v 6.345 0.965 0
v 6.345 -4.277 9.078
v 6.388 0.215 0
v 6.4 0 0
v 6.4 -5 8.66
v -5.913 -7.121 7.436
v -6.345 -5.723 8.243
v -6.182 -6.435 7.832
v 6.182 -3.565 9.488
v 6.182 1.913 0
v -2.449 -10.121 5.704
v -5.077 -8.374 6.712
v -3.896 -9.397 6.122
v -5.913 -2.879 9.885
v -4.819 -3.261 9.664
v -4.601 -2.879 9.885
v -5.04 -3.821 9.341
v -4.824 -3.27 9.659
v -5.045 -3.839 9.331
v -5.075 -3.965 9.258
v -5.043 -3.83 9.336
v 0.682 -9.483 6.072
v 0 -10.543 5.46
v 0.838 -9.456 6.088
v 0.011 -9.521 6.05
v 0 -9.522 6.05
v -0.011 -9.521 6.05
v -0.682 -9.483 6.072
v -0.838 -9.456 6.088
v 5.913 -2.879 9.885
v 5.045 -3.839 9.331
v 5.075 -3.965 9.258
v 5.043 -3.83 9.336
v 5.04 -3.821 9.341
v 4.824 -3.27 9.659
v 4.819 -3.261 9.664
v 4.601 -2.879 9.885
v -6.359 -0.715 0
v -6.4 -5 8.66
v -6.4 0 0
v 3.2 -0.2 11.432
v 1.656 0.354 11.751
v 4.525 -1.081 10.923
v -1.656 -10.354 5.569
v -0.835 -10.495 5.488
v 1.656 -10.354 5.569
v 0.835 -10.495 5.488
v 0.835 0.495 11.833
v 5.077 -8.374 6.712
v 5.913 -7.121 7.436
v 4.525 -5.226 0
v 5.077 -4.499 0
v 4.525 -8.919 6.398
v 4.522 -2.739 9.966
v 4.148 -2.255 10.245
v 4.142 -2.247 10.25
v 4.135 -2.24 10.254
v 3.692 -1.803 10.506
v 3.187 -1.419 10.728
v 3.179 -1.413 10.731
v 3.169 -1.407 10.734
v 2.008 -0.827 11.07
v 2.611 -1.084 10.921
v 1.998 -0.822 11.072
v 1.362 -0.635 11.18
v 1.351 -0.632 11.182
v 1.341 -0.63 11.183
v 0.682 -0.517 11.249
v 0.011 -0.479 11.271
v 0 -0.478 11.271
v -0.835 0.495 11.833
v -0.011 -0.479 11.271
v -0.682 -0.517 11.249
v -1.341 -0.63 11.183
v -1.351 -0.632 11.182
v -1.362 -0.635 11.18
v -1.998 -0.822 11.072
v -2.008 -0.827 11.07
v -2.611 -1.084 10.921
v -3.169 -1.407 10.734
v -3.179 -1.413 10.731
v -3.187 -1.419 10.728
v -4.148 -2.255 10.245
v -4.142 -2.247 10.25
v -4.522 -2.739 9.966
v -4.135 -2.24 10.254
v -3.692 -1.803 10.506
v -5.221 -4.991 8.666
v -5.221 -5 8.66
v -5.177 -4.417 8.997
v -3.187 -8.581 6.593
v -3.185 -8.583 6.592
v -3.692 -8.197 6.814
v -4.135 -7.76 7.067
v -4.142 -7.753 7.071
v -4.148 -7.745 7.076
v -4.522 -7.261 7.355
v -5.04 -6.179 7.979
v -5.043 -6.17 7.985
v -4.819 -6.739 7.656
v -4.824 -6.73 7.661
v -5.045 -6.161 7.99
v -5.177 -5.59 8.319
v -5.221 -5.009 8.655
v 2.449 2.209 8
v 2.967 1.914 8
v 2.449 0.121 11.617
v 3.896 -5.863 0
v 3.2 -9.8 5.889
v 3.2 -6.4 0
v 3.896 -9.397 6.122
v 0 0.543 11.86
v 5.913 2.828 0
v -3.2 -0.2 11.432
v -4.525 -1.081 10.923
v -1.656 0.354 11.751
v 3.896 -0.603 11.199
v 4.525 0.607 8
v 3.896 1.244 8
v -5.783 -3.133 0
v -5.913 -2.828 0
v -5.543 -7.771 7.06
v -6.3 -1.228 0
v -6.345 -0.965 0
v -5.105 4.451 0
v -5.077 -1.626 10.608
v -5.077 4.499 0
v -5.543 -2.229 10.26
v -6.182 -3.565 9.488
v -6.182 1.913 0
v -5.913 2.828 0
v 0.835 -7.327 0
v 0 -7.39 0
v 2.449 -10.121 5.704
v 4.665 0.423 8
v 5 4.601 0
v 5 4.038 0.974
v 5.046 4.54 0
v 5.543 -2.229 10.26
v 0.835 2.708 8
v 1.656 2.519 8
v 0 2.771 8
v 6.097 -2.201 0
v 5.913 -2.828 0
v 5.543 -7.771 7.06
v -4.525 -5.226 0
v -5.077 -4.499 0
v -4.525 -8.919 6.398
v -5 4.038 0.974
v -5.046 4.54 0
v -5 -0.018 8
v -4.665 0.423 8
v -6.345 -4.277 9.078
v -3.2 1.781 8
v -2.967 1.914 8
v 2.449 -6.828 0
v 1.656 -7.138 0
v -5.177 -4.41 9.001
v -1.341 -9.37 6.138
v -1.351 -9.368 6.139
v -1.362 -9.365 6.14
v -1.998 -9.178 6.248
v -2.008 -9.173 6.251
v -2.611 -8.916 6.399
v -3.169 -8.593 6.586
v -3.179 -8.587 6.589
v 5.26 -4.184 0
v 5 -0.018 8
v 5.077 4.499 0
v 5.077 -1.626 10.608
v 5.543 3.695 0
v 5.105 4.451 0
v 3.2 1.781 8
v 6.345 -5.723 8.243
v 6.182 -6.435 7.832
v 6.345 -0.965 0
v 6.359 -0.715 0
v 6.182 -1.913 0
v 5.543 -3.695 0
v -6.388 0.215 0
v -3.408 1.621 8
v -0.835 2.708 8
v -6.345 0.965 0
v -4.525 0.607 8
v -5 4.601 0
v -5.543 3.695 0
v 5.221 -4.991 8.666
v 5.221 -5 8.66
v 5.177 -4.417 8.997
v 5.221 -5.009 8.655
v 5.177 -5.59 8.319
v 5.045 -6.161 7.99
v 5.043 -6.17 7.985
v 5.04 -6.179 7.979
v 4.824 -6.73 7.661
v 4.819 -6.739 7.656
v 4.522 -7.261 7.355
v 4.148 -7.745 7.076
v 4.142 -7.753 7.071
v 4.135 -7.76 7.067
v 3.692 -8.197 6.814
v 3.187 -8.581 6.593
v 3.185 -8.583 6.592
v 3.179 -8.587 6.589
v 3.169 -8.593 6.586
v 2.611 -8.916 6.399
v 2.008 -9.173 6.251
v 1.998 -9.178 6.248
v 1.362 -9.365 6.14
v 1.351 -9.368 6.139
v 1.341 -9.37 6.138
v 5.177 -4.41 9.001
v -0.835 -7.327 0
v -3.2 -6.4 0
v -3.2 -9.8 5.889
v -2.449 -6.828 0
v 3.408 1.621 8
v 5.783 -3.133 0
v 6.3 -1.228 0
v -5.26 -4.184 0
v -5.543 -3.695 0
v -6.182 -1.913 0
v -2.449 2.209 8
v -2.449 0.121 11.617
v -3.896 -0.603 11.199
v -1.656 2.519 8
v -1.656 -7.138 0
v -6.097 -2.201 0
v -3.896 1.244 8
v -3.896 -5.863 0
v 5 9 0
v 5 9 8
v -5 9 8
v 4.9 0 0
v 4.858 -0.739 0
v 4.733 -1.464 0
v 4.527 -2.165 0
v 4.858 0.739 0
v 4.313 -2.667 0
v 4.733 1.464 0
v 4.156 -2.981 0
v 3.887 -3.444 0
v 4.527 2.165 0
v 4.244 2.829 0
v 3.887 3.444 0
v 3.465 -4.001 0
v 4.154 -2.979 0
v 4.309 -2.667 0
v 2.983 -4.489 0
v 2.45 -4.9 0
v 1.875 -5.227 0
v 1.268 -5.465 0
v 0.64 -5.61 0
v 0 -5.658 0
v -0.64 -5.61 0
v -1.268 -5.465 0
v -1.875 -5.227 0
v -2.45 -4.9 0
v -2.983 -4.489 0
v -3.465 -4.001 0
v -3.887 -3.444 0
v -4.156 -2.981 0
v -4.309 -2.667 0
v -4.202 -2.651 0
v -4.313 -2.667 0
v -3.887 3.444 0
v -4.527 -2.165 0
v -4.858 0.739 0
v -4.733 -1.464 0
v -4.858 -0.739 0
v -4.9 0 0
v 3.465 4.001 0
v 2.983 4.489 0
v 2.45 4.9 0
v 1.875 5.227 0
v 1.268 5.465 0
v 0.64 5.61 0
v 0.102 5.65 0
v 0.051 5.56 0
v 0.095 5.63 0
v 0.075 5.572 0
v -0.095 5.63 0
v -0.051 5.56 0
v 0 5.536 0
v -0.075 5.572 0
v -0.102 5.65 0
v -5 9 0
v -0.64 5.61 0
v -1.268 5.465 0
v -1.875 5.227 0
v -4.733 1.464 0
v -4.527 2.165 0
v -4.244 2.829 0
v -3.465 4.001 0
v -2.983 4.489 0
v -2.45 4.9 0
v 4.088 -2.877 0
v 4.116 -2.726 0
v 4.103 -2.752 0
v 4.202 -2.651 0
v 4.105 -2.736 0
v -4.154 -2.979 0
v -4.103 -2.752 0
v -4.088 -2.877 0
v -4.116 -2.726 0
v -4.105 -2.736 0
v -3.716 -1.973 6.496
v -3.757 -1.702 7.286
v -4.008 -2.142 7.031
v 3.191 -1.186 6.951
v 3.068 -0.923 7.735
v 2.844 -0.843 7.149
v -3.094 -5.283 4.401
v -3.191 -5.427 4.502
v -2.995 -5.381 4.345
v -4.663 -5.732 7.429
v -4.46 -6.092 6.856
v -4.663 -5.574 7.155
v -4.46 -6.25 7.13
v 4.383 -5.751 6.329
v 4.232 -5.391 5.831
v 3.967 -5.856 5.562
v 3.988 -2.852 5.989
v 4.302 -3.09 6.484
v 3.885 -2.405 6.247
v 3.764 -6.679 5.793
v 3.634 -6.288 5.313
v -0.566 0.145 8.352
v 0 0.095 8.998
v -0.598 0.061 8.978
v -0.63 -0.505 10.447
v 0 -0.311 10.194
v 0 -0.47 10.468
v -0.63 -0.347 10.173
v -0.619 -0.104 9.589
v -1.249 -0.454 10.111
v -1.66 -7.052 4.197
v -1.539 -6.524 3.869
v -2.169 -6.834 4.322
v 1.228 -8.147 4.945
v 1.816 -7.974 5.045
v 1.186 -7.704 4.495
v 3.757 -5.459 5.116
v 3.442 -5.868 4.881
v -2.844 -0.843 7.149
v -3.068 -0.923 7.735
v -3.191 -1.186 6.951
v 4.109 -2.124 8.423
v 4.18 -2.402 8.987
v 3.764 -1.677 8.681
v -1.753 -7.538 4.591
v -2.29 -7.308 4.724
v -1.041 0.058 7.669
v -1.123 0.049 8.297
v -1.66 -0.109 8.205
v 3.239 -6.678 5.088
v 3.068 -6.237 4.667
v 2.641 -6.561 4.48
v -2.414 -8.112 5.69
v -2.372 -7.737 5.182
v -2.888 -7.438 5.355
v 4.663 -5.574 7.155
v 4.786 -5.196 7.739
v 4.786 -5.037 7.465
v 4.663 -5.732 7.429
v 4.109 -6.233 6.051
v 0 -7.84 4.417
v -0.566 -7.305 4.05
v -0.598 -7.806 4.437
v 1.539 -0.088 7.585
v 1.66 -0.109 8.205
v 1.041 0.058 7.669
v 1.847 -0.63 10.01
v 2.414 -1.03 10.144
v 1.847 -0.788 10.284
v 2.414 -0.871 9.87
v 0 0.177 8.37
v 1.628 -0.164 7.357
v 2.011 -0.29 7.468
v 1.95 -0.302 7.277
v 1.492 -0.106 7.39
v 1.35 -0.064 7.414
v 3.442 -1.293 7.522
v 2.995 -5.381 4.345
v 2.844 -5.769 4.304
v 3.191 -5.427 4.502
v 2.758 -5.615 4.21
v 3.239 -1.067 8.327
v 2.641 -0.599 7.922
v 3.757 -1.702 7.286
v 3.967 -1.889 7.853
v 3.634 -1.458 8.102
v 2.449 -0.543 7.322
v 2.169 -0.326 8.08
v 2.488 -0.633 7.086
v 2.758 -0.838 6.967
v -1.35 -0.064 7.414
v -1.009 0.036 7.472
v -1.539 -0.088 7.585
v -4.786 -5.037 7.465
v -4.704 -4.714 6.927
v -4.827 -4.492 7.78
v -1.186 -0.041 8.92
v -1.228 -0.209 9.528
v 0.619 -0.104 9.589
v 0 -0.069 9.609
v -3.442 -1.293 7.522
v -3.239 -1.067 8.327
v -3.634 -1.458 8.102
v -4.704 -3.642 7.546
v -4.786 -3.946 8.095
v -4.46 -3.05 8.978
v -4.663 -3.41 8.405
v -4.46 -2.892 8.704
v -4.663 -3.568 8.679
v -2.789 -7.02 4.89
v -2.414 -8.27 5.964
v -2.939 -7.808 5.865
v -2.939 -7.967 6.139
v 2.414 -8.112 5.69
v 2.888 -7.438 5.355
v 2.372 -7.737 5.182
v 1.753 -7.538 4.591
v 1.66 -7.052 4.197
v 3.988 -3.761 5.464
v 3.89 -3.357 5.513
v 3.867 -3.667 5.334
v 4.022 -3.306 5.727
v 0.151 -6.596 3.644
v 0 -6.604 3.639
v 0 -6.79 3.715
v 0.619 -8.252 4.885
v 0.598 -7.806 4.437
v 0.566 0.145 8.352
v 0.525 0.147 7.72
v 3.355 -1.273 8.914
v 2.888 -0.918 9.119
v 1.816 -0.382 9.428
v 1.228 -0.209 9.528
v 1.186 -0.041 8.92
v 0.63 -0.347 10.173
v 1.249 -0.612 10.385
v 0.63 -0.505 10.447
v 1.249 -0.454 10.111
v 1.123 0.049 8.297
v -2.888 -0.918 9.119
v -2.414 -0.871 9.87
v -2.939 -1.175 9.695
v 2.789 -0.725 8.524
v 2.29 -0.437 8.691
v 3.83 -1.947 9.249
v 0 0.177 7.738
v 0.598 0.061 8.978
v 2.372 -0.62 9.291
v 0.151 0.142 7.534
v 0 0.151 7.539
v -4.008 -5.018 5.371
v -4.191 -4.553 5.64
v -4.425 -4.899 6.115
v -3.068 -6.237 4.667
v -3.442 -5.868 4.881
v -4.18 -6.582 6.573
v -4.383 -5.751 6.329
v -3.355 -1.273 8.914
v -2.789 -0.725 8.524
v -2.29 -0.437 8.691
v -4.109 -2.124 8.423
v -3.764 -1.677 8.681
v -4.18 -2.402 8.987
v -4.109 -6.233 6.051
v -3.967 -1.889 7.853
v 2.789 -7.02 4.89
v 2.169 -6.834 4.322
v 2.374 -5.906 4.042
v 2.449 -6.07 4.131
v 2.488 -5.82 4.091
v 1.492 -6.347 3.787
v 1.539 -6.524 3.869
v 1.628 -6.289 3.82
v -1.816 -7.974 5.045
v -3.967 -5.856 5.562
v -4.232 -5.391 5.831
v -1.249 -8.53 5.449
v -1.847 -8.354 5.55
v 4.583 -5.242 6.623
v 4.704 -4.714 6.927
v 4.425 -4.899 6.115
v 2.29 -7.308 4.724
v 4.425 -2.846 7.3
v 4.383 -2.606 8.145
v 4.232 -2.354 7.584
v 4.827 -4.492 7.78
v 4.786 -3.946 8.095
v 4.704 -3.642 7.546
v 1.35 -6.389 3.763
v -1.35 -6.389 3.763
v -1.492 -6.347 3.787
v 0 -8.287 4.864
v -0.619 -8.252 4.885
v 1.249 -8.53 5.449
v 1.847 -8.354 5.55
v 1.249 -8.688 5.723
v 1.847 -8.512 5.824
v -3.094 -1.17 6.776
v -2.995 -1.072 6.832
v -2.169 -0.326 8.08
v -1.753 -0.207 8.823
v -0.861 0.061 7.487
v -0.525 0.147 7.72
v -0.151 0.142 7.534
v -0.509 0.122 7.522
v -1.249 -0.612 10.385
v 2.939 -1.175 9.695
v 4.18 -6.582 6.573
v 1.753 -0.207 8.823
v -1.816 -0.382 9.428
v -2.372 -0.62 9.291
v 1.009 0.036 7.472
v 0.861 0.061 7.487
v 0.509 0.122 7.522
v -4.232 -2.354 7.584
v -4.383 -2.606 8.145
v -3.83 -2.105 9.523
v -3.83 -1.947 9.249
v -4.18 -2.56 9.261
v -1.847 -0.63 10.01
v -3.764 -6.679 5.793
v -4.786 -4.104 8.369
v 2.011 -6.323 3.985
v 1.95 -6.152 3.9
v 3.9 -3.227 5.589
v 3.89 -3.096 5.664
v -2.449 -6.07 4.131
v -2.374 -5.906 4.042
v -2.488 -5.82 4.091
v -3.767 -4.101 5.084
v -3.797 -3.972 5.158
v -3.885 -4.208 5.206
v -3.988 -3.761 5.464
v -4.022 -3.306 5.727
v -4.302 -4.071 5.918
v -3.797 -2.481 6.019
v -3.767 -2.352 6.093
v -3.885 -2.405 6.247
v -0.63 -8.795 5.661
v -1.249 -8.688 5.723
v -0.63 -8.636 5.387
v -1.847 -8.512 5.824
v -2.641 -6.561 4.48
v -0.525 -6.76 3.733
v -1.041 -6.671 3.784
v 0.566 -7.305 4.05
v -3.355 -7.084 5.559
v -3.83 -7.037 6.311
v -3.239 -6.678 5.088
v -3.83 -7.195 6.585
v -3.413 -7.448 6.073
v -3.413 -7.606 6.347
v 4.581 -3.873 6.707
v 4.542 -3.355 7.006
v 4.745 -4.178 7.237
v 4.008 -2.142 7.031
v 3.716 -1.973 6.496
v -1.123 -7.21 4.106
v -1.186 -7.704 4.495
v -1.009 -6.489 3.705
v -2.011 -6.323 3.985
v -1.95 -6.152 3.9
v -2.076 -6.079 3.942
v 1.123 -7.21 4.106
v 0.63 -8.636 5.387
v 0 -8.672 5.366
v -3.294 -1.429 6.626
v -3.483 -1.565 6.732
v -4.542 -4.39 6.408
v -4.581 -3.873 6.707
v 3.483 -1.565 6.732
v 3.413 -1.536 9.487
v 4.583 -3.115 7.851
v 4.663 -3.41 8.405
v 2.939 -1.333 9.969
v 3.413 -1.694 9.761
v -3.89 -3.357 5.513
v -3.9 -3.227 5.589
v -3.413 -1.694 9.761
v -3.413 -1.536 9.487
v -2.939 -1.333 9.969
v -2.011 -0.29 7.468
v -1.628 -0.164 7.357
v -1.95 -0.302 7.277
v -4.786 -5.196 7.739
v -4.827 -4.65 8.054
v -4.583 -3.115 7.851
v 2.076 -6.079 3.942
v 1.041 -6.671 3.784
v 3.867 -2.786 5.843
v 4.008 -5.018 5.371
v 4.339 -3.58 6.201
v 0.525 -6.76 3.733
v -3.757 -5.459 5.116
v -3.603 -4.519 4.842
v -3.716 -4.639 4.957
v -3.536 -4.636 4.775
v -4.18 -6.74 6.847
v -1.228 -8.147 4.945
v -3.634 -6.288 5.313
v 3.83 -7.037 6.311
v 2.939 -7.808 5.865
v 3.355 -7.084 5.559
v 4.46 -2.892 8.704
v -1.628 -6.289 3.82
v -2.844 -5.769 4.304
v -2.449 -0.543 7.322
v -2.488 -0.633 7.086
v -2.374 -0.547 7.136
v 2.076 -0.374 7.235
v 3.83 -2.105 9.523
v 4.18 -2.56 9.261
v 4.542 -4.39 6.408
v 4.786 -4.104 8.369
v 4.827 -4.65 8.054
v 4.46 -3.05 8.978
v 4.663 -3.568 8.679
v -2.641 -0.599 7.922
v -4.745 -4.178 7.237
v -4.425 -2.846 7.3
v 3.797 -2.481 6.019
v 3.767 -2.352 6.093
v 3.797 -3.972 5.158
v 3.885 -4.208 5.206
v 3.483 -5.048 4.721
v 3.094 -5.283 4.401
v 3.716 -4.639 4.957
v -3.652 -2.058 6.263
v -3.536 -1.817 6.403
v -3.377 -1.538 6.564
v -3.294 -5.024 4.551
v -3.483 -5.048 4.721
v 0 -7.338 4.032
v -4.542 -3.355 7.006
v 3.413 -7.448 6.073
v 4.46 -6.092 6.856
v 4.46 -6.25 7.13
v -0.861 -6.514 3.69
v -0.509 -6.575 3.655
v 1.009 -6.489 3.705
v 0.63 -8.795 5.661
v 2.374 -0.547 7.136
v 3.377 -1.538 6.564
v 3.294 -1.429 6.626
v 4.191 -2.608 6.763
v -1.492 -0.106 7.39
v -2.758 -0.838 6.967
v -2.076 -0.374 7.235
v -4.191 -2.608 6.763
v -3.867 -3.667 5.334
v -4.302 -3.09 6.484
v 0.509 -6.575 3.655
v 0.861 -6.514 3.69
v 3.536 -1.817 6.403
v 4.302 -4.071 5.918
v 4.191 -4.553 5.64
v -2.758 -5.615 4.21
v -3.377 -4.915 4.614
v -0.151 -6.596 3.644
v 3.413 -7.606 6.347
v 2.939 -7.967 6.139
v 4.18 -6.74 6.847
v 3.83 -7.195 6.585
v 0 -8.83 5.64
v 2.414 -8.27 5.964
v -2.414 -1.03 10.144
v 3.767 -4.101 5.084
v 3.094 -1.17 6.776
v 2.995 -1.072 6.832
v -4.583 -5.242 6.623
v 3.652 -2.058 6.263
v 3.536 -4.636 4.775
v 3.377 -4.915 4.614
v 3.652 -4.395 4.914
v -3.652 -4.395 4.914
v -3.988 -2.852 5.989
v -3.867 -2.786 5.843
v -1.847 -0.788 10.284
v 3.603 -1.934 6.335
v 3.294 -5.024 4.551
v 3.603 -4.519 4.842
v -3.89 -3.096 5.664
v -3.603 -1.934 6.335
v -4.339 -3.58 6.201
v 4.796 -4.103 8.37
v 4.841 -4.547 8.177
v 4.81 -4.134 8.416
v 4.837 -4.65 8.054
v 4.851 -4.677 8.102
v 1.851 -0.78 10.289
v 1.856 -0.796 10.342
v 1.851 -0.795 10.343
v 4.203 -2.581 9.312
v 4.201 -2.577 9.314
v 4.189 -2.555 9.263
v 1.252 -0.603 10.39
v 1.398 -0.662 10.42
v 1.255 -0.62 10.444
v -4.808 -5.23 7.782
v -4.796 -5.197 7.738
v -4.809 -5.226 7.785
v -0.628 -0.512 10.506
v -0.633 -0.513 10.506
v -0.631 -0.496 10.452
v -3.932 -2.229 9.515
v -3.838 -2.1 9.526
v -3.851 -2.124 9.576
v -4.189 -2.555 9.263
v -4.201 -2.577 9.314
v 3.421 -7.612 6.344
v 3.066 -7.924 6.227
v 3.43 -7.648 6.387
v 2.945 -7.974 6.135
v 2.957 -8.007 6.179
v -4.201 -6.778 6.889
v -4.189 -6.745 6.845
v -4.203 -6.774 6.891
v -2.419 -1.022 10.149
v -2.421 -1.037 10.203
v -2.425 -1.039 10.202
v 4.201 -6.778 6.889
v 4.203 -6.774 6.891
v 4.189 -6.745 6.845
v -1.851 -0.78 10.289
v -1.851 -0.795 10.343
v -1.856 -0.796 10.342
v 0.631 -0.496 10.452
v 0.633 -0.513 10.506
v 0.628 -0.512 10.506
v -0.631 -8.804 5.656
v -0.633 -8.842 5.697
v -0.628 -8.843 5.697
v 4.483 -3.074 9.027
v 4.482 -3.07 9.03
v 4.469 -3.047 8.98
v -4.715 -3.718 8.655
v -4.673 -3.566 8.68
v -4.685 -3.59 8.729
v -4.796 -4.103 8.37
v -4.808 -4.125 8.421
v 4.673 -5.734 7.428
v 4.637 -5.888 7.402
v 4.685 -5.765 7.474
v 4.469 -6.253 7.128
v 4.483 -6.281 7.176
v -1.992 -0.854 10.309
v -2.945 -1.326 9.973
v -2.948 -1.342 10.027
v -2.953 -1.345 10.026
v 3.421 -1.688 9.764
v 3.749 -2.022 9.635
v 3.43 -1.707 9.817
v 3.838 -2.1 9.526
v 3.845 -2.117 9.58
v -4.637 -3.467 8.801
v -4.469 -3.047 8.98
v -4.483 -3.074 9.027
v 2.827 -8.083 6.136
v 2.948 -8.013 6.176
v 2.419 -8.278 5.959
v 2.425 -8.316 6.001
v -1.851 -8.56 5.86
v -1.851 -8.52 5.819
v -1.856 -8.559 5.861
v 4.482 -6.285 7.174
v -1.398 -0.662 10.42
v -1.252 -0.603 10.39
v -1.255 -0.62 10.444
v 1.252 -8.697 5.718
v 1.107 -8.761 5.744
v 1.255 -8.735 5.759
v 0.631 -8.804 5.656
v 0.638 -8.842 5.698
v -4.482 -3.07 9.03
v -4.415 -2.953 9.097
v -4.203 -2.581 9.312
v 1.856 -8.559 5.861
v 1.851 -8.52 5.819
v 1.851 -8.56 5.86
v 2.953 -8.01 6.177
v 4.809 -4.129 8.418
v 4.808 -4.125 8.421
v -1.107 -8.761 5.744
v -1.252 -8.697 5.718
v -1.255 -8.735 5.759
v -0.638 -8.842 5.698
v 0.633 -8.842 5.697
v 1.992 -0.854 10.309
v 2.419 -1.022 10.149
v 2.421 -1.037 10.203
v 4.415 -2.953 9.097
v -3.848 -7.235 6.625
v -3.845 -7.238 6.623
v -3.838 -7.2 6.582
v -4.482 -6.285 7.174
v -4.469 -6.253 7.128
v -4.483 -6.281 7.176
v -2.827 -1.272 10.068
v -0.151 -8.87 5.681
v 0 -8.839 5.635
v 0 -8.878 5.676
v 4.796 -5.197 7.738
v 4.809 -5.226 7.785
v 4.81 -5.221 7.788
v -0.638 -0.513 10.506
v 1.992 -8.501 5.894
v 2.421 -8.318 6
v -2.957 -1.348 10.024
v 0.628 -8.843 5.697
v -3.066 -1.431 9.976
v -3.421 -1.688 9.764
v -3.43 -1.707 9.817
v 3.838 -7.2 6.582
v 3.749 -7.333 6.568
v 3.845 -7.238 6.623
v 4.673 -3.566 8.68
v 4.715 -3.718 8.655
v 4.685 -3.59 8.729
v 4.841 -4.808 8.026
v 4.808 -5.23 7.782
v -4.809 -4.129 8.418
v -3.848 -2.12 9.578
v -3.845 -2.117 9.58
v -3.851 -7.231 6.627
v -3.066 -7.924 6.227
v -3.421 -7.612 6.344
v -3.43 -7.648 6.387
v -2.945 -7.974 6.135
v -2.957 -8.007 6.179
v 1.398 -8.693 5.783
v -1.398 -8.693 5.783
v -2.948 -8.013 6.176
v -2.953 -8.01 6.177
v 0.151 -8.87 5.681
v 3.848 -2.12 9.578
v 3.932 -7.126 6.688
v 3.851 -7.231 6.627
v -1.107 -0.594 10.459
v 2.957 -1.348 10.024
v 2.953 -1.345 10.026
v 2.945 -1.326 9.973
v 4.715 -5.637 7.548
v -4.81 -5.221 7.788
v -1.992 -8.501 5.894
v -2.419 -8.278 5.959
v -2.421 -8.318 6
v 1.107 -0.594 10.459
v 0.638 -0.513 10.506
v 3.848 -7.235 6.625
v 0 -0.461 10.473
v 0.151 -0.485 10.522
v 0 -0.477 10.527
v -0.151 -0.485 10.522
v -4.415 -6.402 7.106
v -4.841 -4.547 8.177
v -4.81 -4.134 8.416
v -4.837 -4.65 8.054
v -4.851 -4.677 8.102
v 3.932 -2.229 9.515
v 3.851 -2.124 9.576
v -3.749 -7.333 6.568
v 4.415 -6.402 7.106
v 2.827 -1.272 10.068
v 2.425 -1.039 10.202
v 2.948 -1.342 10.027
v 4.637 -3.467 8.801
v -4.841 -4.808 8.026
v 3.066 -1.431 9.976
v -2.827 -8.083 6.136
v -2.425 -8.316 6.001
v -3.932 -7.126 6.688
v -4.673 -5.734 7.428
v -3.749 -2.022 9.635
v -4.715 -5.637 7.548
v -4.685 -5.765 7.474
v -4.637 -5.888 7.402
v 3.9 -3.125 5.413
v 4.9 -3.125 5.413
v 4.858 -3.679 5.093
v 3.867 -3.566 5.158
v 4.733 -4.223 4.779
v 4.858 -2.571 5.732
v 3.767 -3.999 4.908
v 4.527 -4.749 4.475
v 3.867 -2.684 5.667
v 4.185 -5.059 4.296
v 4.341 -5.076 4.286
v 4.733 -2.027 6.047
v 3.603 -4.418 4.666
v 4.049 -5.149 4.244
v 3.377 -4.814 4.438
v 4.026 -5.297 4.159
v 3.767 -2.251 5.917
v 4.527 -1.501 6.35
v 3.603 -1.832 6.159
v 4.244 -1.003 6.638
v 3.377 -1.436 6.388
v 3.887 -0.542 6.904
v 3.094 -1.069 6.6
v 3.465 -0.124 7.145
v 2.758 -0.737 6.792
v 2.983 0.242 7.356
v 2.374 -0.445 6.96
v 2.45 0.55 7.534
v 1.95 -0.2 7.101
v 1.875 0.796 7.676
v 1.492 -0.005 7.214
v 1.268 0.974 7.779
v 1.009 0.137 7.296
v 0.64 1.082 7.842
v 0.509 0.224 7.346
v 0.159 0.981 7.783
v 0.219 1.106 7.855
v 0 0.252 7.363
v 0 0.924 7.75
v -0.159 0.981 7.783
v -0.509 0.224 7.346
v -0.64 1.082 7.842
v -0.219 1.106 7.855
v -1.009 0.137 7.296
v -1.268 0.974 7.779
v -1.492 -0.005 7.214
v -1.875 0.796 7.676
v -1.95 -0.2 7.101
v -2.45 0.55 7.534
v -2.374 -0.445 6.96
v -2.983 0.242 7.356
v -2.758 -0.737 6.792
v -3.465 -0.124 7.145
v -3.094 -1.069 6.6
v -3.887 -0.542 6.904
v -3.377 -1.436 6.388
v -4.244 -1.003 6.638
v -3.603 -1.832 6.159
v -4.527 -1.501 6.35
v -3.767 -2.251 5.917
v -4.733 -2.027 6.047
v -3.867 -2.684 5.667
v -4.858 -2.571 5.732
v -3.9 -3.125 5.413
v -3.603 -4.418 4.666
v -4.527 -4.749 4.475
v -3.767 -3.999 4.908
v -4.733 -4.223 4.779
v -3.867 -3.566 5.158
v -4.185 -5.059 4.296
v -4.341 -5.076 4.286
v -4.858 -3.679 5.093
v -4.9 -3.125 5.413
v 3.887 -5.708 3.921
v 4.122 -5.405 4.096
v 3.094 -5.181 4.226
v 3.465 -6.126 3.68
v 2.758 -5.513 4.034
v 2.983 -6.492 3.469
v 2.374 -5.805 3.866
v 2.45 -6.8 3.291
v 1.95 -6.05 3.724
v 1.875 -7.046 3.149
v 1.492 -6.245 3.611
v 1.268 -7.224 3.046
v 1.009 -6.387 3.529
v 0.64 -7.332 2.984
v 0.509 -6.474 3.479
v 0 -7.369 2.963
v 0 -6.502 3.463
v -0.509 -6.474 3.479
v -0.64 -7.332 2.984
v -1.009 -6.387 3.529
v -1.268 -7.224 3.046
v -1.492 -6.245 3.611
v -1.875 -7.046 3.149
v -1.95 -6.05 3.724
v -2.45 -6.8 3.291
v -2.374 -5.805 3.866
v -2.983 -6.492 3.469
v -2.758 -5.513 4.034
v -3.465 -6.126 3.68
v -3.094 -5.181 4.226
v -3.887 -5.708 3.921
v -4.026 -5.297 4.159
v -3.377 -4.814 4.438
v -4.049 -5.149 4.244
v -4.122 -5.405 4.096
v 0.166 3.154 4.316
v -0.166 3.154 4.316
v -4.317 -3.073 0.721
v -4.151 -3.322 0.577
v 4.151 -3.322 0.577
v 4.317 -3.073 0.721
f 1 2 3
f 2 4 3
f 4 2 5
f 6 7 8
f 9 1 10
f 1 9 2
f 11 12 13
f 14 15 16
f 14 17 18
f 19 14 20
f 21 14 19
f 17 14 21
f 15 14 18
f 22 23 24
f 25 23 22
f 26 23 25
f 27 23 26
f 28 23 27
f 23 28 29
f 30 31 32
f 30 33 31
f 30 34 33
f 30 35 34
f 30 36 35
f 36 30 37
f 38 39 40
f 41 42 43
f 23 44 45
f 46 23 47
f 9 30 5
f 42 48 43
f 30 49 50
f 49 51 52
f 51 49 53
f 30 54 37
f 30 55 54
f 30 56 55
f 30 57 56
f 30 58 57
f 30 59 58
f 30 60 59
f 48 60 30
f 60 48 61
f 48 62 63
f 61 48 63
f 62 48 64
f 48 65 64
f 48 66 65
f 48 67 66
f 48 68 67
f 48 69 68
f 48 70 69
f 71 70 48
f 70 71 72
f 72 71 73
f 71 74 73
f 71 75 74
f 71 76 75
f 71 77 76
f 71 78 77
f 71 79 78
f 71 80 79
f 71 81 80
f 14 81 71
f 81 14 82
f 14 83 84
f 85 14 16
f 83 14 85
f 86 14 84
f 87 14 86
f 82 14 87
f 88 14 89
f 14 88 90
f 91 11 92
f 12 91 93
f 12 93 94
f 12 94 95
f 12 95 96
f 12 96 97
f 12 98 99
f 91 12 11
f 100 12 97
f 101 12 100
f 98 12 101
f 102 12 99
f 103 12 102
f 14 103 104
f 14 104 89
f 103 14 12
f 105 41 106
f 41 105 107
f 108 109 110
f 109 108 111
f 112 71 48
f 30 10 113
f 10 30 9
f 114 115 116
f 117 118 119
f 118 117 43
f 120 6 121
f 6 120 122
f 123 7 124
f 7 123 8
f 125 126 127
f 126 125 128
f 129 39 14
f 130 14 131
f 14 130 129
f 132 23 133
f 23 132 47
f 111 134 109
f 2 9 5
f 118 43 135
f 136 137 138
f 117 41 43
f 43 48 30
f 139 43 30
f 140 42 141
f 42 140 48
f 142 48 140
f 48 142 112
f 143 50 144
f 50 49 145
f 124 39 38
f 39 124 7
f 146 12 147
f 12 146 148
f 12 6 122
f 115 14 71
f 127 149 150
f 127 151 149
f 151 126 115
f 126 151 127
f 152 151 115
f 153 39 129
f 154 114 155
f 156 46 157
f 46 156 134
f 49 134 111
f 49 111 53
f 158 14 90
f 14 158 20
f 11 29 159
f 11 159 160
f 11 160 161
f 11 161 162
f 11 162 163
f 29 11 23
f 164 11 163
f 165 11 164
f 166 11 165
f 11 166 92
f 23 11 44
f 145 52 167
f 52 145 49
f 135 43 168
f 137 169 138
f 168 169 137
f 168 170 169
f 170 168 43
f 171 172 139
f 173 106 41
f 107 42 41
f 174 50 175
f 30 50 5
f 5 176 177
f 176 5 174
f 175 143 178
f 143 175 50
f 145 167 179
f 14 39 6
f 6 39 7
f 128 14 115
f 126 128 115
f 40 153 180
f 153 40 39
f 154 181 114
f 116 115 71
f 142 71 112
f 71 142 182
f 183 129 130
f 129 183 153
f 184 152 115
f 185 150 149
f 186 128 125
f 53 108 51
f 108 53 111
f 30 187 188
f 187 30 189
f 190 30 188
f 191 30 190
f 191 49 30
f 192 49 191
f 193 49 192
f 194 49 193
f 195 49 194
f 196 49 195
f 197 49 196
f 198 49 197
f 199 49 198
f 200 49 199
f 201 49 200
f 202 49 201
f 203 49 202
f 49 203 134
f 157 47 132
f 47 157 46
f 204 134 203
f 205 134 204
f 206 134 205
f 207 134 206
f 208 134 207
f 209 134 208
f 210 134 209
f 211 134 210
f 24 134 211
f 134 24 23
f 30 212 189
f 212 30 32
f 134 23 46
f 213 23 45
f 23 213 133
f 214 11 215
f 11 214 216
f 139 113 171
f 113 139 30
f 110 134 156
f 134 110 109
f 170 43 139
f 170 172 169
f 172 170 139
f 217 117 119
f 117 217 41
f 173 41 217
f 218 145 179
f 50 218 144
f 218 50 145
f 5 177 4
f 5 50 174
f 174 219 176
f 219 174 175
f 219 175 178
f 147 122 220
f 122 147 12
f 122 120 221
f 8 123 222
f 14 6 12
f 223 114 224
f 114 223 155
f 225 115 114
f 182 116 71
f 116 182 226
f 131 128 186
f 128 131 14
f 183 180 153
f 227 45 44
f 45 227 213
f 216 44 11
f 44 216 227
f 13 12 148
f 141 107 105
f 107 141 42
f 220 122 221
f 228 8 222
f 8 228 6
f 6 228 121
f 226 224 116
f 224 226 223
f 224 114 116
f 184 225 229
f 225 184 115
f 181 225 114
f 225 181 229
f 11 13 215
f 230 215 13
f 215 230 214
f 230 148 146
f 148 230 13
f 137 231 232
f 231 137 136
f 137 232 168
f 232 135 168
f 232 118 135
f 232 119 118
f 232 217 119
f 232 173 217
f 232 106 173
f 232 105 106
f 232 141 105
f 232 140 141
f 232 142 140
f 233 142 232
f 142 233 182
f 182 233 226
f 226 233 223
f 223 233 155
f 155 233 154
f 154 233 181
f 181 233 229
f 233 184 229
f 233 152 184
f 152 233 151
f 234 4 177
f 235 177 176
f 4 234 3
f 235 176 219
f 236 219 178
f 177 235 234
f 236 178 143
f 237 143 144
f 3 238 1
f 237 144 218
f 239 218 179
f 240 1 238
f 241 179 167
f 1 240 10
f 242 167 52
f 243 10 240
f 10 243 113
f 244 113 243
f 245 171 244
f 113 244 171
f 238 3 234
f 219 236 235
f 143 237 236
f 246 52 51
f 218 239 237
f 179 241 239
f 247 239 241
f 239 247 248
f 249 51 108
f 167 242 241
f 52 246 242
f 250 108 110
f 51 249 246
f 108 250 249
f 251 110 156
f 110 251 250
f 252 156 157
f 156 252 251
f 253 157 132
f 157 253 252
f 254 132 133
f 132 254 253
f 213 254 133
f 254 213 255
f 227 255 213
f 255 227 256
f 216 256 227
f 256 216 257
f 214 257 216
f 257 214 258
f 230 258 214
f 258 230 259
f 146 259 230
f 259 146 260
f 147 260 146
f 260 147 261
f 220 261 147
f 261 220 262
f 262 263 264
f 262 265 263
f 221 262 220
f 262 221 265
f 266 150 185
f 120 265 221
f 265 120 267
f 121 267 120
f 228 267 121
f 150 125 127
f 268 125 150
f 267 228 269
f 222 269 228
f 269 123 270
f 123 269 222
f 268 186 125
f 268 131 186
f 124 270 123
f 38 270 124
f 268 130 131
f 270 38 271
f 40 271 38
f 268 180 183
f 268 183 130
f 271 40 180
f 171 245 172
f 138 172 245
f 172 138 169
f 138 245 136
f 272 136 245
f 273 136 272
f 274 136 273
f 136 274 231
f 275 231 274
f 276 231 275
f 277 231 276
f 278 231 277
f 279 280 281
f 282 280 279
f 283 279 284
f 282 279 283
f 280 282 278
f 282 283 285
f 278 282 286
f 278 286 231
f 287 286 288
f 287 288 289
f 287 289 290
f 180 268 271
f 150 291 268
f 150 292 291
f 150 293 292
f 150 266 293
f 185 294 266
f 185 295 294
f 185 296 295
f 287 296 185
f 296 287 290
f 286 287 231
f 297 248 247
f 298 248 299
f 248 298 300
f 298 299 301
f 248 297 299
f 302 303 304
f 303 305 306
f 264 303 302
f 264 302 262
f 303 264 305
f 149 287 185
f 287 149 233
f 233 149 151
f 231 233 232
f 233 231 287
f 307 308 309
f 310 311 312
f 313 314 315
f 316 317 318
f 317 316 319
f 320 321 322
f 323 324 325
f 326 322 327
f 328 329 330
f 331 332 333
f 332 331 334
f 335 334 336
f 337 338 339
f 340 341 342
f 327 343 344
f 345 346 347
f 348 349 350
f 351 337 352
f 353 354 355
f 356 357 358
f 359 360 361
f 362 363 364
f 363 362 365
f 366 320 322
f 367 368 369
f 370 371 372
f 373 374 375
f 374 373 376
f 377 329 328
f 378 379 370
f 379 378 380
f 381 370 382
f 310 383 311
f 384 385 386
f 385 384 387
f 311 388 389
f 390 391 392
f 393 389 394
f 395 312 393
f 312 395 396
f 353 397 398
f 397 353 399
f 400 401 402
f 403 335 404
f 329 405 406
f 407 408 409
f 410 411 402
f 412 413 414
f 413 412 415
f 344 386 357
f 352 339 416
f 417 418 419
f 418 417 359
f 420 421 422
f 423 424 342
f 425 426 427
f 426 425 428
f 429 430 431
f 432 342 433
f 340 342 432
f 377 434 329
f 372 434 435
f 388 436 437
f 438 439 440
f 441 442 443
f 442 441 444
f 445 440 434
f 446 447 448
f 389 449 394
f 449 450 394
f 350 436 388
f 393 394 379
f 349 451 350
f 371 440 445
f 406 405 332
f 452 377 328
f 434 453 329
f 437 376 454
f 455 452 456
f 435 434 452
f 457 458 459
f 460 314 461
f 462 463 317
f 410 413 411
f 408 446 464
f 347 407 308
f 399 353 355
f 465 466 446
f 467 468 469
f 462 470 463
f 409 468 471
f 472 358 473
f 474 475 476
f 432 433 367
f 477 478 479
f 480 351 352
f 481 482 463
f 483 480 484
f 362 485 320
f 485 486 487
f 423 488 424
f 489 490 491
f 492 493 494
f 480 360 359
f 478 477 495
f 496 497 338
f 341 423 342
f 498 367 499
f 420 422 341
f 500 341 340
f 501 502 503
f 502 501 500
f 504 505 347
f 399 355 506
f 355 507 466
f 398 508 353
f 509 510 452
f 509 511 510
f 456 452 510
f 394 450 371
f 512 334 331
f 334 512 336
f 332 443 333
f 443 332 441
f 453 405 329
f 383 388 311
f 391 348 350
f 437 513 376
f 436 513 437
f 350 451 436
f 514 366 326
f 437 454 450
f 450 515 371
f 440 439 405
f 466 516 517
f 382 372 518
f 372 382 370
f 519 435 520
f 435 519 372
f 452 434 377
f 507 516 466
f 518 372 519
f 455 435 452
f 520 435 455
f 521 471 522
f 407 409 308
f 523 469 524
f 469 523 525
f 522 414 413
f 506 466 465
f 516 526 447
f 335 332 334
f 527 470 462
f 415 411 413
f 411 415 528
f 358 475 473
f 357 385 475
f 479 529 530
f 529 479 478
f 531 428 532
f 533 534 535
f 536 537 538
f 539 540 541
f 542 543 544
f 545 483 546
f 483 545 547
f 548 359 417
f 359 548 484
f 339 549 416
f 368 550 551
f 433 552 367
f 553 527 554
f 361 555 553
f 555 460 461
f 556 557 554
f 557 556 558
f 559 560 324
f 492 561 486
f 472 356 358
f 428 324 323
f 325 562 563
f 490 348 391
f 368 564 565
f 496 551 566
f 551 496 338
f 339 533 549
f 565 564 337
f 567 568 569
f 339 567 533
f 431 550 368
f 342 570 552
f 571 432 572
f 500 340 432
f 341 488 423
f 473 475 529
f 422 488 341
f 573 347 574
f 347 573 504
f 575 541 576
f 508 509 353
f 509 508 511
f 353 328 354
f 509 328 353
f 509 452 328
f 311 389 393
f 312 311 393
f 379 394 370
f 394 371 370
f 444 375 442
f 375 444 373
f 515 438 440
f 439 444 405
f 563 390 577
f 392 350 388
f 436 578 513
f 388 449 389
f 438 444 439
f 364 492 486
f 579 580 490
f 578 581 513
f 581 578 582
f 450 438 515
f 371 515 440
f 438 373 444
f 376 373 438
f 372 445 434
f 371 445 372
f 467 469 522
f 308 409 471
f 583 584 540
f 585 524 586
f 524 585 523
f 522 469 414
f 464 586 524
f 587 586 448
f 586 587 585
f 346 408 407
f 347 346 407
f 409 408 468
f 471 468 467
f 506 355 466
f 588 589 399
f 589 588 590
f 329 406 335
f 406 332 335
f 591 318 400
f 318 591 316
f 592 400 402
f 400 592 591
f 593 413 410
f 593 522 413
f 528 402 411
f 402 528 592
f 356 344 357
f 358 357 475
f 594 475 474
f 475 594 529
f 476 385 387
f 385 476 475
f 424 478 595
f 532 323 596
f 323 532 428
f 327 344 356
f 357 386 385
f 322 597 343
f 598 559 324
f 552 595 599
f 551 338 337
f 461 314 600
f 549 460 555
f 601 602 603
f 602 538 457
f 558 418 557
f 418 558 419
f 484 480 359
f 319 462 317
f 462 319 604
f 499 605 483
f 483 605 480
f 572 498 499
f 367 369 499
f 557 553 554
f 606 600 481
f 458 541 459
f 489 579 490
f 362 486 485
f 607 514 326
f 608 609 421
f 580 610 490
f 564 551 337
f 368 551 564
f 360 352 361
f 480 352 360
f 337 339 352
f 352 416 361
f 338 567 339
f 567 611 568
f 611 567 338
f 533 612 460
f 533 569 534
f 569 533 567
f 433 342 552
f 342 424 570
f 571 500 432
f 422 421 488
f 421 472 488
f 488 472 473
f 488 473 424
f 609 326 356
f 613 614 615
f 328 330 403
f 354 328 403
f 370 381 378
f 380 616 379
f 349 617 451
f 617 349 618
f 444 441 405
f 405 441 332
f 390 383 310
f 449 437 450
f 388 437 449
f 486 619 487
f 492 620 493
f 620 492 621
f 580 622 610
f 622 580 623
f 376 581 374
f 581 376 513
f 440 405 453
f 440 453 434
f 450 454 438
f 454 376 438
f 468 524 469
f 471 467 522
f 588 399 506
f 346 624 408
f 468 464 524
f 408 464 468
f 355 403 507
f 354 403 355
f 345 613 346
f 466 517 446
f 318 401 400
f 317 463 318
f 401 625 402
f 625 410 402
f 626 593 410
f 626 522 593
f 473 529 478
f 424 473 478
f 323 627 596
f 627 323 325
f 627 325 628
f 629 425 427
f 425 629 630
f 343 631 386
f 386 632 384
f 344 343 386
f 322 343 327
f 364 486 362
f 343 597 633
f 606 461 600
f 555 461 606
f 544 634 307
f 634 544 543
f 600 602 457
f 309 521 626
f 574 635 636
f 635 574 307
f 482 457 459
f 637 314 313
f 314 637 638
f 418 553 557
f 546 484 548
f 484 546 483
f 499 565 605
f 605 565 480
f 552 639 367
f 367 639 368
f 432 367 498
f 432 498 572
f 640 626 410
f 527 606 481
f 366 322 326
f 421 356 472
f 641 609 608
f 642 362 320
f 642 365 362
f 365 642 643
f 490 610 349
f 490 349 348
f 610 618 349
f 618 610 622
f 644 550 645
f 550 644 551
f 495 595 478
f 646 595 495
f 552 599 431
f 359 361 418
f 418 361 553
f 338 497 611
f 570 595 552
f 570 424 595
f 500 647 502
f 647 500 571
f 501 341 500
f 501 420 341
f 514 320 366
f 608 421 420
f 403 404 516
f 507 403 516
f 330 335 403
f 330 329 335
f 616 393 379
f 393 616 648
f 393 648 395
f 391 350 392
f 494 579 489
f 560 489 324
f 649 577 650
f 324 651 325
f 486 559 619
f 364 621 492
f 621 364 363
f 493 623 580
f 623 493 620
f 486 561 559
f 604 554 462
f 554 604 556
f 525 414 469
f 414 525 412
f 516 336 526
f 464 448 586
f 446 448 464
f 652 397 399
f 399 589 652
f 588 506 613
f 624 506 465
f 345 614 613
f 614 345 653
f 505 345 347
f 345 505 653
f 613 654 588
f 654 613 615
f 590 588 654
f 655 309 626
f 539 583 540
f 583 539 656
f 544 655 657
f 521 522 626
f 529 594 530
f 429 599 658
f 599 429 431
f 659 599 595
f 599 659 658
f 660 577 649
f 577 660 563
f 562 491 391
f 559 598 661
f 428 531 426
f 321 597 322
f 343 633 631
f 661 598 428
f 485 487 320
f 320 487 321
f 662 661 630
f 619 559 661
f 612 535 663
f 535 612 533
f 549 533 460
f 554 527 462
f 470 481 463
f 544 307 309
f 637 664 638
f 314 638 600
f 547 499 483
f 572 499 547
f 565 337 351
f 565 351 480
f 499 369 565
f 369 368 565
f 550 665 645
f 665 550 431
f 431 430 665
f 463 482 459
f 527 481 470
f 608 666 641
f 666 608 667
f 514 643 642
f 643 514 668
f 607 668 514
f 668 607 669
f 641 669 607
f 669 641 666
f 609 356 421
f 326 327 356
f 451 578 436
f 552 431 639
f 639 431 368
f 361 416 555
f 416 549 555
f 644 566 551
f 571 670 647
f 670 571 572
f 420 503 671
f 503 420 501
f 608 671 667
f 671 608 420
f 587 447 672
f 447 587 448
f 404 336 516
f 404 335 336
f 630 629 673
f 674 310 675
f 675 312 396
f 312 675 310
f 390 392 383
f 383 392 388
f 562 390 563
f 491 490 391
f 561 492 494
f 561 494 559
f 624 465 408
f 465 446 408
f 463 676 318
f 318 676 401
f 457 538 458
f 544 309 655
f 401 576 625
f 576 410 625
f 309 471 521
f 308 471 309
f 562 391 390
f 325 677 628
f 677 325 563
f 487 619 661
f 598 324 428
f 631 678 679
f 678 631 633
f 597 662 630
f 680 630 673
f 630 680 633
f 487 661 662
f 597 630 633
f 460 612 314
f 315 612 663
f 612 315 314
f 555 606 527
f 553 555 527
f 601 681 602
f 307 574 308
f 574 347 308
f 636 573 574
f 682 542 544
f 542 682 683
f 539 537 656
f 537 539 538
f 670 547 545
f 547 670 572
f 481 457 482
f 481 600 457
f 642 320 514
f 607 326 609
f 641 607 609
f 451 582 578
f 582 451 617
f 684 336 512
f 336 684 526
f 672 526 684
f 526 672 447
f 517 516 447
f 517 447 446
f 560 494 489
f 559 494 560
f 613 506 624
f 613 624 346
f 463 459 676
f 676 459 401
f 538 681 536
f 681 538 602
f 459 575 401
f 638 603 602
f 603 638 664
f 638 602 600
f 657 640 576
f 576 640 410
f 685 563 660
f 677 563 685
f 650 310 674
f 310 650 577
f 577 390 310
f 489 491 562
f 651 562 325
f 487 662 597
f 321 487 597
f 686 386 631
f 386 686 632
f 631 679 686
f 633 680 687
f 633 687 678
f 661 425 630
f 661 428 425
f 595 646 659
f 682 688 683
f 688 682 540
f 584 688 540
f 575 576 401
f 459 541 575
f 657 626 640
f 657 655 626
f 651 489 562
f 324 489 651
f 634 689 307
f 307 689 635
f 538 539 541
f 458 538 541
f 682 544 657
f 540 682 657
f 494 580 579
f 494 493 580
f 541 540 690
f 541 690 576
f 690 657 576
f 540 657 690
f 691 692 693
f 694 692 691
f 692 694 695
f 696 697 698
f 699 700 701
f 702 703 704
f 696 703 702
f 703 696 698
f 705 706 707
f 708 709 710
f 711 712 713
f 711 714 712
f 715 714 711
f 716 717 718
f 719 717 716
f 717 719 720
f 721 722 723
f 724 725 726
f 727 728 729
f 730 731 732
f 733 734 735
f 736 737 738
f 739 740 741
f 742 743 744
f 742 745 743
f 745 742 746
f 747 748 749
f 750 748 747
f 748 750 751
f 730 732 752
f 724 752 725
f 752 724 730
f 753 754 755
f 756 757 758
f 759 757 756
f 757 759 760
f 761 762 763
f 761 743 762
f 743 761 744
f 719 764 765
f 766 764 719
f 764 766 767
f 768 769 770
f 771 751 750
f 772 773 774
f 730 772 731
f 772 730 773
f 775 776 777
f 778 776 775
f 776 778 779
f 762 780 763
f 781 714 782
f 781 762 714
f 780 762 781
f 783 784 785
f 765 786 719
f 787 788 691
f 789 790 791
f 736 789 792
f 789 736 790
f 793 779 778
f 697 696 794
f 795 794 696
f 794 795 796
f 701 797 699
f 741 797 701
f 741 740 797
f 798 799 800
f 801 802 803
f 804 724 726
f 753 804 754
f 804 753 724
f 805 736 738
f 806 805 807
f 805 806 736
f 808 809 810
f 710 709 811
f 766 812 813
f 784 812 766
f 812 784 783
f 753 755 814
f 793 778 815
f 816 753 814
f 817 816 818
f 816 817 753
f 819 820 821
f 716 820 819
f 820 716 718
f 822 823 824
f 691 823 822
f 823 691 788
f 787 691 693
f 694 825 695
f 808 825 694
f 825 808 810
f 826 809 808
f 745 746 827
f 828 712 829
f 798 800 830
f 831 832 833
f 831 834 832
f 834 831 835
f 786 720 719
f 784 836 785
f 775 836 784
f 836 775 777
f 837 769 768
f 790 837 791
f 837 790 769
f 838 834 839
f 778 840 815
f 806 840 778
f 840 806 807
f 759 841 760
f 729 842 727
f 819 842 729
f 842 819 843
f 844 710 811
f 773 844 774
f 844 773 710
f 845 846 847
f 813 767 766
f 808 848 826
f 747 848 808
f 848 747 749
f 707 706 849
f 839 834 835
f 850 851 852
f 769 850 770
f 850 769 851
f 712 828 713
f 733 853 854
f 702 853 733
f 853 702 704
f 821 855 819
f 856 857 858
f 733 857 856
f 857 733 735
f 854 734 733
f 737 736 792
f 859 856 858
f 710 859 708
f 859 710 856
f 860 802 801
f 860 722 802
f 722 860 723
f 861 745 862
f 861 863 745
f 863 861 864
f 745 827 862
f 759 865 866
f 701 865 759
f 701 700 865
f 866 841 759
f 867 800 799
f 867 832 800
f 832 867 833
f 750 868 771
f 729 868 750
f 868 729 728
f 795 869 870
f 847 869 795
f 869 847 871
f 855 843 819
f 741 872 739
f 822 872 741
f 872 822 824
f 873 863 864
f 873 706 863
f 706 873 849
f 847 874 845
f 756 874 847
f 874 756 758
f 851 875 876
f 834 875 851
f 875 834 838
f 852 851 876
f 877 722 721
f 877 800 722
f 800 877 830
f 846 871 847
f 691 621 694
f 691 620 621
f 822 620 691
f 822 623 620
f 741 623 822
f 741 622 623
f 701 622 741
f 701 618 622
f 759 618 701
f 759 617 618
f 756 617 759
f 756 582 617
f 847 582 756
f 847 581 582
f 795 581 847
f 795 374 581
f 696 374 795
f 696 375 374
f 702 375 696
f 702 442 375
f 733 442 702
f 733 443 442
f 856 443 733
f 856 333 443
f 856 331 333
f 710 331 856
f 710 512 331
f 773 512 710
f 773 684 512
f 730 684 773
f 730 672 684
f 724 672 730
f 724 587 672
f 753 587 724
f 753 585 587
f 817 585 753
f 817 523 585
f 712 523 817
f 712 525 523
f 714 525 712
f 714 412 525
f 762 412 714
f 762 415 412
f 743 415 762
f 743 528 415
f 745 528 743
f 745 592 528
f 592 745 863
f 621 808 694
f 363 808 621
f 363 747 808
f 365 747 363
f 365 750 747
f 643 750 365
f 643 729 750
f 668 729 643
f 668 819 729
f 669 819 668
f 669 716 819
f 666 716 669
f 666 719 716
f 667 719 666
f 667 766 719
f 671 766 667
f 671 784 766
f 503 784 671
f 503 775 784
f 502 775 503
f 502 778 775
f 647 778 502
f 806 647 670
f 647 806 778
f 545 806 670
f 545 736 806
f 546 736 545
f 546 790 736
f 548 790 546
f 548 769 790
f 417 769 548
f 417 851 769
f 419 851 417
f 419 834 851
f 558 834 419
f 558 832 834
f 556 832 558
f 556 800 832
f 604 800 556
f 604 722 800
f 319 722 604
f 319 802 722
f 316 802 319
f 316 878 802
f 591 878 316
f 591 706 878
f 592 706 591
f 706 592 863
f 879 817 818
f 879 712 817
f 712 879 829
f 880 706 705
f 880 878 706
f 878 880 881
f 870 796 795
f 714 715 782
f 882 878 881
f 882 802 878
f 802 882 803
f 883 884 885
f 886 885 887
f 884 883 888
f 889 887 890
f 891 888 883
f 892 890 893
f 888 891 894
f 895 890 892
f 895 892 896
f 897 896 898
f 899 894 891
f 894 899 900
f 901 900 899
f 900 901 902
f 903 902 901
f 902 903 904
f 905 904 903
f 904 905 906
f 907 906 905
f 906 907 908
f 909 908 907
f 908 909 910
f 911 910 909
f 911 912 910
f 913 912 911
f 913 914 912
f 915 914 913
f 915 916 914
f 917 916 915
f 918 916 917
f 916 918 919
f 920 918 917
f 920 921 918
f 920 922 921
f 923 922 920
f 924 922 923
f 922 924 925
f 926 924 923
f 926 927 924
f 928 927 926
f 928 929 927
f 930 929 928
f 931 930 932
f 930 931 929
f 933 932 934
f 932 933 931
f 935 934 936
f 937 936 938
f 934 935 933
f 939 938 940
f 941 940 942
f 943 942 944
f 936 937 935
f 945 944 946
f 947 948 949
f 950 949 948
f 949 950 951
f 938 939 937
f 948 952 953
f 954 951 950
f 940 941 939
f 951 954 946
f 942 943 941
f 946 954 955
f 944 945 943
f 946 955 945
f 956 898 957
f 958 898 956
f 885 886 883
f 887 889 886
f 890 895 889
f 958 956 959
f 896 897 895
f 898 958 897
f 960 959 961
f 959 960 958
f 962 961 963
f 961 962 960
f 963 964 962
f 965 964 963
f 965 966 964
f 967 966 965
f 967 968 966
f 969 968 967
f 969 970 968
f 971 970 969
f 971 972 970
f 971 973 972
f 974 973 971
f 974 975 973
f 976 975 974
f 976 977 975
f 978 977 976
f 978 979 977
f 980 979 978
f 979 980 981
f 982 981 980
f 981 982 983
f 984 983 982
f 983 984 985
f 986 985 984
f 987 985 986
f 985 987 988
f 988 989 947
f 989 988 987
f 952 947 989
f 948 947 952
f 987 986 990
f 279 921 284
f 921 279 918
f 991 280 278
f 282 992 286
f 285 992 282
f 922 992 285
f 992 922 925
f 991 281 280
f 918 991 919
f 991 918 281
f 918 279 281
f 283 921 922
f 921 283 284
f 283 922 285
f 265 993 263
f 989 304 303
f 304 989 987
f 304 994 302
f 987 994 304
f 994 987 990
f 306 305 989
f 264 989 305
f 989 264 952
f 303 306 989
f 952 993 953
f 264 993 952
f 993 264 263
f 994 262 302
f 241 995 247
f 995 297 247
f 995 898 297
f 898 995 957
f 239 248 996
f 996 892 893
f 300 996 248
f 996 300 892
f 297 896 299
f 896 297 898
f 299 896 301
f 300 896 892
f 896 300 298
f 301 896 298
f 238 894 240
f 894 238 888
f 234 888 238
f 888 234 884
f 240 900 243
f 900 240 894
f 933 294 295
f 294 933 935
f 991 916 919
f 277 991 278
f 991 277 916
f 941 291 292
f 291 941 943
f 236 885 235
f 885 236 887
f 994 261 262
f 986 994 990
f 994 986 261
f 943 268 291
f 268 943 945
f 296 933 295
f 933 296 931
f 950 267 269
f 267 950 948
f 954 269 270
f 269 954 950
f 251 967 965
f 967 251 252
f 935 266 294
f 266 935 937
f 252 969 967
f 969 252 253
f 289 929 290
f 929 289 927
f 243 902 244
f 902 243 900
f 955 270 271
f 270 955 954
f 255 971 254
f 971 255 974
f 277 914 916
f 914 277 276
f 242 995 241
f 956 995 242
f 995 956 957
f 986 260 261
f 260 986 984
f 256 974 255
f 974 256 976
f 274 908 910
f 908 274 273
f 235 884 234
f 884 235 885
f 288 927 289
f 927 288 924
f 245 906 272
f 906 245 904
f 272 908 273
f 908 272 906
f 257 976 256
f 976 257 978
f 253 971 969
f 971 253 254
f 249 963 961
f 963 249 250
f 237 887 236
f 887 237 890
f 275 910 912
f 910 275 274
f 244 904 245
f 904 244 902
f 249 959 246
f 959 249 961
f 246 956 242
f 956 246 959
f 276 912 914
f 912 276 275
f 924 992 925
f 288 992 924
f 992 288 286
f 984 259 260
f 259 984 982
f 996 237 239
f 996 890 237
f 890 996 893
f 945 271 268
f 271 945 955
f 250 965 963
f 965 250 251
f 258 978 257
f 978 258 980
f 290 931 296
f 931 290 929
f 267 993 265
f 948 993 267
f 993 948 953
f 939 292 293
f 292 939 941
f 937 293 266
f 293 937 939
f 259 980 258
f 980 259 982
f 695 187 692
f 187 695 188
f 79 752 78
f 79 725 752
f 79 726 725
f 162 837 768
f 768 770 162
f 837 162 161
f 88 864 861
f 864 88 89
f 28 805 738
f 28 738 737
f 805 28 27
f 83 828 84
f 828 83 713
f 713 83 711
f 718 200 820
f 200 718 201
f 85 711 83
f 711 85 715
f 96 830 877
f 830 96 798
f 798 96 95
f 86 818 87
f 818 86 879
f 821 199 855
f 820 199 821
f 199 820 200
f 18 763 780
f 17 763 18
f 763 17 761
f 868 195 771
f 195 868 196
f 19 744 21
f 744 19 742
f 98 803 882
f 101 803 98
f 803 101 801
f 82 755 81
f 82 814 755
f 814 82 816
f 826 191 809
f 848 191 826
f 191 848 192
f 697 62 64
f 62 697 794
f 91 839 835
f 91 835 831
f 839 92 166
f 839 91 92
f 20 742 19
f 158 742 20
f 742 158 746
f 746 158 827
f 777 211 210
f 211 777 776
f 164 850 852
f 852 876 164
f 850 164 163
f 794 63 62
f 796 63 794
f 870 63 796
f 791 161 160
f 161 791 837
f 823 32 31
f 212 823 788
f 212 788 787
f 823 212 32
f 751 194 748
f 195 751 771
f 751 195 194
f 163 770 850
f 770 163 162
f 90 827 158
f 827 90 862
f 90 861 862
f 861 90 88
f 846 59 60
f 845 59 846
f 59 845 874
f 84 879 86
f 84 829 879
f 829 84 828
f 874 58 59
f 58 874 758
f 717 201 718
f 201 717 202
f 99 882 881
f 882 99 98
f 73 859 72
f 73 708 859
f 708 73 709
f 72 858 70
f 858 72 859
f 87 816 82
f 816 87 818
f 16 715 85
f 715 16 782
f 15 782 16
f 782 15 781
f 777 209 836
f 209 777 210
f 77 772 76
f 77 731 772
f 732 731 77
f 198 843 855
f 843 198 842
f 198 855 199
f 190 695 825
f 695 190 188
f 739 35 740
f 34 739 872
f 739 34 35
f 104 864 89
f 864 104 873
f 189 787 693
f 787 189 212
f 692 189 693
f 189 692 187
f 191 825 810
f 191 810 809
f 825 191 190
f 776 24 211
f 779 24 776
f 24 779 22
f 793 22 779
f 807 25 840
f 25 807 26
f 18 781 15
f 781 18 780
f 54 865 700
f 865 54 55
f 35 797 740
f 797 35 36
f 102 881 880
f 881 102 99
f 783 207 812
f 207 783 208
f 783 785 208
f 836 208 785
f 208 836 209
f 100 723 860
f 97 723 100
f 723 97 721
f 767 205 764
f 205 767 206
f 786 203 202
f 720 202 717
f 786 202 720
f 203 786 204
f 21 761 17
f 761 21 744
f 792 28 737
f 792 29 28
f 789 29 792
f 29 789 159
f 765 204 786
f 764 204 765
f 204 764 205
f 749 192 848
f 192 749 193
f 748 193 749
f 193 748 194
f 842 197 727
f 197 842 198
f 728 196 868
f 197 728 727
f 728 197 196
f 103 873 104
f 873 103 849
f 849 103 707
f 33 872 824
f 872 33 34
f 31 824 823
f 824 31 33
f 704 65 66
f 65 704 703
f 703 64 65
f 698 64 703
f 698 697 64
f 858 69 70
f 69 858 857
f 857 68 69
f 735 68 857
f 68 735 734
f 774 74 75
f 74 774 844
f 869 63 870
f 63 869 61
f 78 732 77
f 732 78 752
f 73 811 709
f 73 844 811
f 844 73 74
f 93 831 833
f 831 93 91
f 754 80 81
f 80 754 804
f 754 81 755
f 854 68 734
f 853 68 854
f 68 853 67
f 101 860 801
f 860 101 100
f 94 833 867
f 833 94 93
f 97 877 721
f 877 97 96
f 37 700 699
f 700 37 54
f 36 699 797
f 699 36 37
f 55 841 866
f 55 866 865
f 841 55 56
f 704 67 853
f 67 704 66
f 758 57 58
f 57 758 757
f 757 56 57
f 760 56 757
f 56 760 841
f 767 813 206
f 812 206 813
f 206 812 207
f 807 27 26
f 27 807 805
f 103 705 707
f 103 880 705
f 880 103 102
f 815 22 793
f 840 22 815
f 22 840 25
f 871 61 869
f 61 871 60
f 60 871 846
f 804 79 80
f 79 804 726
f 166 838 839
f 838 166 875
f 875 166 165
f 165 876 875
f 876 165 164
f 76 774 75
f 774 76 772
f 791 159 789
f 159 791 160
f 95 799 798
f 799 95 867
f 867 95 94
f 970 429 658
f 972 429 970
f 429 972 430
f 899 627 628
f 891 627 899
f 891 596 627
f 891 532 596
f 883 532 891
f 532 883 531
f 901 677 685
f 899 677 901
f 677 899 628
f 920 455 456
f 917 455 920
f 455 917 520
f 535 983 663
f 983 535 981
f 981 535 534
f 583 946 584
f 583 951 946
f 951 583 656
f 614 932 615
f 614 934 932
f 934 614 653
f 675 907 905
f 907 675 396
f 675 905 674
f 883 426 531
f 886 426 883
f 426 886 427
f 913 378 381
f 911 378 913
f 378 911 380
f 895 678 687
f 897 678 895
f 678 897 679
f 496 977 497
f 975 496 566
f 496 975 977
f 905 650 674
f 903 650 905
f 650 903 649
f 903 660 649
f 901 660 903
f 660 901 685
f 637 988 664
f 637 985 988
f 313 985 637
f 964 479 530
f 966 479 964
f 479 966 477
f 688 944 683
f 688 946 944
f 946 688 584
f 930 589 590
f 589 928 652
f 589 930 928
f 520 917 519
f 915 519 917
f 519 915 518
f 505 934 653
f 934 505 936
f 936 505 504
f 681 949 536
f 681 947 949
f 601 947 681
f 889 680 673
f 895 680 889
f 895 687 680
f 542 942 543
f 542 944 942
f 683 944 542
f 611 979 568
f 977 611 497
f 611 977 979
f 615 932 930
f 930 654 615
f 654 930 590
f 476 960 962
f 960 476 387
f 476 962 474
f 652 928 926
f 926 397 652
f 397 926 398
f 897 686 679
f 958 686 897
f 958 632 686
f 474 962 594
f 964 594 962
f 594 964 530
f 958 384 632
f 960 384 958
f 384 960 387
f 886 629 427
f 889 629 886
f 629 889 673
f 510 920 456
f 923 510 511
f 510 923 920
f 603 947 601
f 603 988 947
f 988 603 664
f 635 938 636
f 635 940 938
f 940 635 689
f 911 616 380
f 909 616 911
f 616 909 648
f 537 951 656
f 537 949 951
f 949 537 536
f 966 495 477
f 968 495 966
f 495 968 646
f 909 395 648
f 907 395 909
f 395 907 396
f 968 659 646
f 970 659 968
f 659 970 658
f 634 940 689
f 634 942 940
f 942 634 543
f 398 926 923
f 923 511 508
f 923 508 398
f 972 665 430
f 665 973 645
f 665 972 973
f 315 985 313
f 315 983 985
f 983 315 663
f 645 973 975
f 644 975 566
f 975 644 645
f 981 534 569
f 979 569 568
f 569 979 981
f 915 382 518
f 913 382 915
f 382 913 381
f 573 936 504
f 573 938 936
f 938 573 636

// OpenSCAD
MagneticAngle = 30;
MagnetOuterDiameter = 9.8;
MagnetInnerDiameter = 2.75;
MagneticHeight = 15;
height = 8;
SocketDiameter = MagnetOuterDiameter + 3;
BearingDiameter = 9.5;
BearingDialation = 0.175;

Blah = 13.25;
difference() {
	union() {
		rotate([MagneticAngle,0,0]) {
			translate([0, 0, -3])
			cylinder(h=13,d=SocketDiameter,$fn=48);
		}
		translate([-5,-1,0])cube([10,10,8]);
	}
	translate([0,0,-height/2])cube([100,100,height],center=true);

	rotate([MagneticAngle,0,0]) {
		translate([0,0,9.3]) {
			sphere(d=BearingDiameter+BearingDialation, $fn=48);
			cylinder(h=BearingDiameter, d1=BearingDiameter+BearingDialation, d2=BearingDiameter*1.5, $fn=48);
		}
		translate([0,0,10.7-3])cylinder(h=2.35,d1=MagnetOuterDiameter-2,d2=BearingDiameter+1,$fn=48);
		translate([0,0,3])cylinder(h=6,d=MagnetOuterDiameter-2,$fn=48);
		translate([0,0,-7]) difference() {
			cylinder(h=Blah,d=MagnetOuterDiameter,$fn=48);
			for(ang = [0,120,240]) rotate([0,0,ang]) {
				translate([0,MagnetOuterDiameter/2]) cylinder(h=Blah,d1=0.1, d2=0.45,$fn=8);
			}
		}
	}
}
